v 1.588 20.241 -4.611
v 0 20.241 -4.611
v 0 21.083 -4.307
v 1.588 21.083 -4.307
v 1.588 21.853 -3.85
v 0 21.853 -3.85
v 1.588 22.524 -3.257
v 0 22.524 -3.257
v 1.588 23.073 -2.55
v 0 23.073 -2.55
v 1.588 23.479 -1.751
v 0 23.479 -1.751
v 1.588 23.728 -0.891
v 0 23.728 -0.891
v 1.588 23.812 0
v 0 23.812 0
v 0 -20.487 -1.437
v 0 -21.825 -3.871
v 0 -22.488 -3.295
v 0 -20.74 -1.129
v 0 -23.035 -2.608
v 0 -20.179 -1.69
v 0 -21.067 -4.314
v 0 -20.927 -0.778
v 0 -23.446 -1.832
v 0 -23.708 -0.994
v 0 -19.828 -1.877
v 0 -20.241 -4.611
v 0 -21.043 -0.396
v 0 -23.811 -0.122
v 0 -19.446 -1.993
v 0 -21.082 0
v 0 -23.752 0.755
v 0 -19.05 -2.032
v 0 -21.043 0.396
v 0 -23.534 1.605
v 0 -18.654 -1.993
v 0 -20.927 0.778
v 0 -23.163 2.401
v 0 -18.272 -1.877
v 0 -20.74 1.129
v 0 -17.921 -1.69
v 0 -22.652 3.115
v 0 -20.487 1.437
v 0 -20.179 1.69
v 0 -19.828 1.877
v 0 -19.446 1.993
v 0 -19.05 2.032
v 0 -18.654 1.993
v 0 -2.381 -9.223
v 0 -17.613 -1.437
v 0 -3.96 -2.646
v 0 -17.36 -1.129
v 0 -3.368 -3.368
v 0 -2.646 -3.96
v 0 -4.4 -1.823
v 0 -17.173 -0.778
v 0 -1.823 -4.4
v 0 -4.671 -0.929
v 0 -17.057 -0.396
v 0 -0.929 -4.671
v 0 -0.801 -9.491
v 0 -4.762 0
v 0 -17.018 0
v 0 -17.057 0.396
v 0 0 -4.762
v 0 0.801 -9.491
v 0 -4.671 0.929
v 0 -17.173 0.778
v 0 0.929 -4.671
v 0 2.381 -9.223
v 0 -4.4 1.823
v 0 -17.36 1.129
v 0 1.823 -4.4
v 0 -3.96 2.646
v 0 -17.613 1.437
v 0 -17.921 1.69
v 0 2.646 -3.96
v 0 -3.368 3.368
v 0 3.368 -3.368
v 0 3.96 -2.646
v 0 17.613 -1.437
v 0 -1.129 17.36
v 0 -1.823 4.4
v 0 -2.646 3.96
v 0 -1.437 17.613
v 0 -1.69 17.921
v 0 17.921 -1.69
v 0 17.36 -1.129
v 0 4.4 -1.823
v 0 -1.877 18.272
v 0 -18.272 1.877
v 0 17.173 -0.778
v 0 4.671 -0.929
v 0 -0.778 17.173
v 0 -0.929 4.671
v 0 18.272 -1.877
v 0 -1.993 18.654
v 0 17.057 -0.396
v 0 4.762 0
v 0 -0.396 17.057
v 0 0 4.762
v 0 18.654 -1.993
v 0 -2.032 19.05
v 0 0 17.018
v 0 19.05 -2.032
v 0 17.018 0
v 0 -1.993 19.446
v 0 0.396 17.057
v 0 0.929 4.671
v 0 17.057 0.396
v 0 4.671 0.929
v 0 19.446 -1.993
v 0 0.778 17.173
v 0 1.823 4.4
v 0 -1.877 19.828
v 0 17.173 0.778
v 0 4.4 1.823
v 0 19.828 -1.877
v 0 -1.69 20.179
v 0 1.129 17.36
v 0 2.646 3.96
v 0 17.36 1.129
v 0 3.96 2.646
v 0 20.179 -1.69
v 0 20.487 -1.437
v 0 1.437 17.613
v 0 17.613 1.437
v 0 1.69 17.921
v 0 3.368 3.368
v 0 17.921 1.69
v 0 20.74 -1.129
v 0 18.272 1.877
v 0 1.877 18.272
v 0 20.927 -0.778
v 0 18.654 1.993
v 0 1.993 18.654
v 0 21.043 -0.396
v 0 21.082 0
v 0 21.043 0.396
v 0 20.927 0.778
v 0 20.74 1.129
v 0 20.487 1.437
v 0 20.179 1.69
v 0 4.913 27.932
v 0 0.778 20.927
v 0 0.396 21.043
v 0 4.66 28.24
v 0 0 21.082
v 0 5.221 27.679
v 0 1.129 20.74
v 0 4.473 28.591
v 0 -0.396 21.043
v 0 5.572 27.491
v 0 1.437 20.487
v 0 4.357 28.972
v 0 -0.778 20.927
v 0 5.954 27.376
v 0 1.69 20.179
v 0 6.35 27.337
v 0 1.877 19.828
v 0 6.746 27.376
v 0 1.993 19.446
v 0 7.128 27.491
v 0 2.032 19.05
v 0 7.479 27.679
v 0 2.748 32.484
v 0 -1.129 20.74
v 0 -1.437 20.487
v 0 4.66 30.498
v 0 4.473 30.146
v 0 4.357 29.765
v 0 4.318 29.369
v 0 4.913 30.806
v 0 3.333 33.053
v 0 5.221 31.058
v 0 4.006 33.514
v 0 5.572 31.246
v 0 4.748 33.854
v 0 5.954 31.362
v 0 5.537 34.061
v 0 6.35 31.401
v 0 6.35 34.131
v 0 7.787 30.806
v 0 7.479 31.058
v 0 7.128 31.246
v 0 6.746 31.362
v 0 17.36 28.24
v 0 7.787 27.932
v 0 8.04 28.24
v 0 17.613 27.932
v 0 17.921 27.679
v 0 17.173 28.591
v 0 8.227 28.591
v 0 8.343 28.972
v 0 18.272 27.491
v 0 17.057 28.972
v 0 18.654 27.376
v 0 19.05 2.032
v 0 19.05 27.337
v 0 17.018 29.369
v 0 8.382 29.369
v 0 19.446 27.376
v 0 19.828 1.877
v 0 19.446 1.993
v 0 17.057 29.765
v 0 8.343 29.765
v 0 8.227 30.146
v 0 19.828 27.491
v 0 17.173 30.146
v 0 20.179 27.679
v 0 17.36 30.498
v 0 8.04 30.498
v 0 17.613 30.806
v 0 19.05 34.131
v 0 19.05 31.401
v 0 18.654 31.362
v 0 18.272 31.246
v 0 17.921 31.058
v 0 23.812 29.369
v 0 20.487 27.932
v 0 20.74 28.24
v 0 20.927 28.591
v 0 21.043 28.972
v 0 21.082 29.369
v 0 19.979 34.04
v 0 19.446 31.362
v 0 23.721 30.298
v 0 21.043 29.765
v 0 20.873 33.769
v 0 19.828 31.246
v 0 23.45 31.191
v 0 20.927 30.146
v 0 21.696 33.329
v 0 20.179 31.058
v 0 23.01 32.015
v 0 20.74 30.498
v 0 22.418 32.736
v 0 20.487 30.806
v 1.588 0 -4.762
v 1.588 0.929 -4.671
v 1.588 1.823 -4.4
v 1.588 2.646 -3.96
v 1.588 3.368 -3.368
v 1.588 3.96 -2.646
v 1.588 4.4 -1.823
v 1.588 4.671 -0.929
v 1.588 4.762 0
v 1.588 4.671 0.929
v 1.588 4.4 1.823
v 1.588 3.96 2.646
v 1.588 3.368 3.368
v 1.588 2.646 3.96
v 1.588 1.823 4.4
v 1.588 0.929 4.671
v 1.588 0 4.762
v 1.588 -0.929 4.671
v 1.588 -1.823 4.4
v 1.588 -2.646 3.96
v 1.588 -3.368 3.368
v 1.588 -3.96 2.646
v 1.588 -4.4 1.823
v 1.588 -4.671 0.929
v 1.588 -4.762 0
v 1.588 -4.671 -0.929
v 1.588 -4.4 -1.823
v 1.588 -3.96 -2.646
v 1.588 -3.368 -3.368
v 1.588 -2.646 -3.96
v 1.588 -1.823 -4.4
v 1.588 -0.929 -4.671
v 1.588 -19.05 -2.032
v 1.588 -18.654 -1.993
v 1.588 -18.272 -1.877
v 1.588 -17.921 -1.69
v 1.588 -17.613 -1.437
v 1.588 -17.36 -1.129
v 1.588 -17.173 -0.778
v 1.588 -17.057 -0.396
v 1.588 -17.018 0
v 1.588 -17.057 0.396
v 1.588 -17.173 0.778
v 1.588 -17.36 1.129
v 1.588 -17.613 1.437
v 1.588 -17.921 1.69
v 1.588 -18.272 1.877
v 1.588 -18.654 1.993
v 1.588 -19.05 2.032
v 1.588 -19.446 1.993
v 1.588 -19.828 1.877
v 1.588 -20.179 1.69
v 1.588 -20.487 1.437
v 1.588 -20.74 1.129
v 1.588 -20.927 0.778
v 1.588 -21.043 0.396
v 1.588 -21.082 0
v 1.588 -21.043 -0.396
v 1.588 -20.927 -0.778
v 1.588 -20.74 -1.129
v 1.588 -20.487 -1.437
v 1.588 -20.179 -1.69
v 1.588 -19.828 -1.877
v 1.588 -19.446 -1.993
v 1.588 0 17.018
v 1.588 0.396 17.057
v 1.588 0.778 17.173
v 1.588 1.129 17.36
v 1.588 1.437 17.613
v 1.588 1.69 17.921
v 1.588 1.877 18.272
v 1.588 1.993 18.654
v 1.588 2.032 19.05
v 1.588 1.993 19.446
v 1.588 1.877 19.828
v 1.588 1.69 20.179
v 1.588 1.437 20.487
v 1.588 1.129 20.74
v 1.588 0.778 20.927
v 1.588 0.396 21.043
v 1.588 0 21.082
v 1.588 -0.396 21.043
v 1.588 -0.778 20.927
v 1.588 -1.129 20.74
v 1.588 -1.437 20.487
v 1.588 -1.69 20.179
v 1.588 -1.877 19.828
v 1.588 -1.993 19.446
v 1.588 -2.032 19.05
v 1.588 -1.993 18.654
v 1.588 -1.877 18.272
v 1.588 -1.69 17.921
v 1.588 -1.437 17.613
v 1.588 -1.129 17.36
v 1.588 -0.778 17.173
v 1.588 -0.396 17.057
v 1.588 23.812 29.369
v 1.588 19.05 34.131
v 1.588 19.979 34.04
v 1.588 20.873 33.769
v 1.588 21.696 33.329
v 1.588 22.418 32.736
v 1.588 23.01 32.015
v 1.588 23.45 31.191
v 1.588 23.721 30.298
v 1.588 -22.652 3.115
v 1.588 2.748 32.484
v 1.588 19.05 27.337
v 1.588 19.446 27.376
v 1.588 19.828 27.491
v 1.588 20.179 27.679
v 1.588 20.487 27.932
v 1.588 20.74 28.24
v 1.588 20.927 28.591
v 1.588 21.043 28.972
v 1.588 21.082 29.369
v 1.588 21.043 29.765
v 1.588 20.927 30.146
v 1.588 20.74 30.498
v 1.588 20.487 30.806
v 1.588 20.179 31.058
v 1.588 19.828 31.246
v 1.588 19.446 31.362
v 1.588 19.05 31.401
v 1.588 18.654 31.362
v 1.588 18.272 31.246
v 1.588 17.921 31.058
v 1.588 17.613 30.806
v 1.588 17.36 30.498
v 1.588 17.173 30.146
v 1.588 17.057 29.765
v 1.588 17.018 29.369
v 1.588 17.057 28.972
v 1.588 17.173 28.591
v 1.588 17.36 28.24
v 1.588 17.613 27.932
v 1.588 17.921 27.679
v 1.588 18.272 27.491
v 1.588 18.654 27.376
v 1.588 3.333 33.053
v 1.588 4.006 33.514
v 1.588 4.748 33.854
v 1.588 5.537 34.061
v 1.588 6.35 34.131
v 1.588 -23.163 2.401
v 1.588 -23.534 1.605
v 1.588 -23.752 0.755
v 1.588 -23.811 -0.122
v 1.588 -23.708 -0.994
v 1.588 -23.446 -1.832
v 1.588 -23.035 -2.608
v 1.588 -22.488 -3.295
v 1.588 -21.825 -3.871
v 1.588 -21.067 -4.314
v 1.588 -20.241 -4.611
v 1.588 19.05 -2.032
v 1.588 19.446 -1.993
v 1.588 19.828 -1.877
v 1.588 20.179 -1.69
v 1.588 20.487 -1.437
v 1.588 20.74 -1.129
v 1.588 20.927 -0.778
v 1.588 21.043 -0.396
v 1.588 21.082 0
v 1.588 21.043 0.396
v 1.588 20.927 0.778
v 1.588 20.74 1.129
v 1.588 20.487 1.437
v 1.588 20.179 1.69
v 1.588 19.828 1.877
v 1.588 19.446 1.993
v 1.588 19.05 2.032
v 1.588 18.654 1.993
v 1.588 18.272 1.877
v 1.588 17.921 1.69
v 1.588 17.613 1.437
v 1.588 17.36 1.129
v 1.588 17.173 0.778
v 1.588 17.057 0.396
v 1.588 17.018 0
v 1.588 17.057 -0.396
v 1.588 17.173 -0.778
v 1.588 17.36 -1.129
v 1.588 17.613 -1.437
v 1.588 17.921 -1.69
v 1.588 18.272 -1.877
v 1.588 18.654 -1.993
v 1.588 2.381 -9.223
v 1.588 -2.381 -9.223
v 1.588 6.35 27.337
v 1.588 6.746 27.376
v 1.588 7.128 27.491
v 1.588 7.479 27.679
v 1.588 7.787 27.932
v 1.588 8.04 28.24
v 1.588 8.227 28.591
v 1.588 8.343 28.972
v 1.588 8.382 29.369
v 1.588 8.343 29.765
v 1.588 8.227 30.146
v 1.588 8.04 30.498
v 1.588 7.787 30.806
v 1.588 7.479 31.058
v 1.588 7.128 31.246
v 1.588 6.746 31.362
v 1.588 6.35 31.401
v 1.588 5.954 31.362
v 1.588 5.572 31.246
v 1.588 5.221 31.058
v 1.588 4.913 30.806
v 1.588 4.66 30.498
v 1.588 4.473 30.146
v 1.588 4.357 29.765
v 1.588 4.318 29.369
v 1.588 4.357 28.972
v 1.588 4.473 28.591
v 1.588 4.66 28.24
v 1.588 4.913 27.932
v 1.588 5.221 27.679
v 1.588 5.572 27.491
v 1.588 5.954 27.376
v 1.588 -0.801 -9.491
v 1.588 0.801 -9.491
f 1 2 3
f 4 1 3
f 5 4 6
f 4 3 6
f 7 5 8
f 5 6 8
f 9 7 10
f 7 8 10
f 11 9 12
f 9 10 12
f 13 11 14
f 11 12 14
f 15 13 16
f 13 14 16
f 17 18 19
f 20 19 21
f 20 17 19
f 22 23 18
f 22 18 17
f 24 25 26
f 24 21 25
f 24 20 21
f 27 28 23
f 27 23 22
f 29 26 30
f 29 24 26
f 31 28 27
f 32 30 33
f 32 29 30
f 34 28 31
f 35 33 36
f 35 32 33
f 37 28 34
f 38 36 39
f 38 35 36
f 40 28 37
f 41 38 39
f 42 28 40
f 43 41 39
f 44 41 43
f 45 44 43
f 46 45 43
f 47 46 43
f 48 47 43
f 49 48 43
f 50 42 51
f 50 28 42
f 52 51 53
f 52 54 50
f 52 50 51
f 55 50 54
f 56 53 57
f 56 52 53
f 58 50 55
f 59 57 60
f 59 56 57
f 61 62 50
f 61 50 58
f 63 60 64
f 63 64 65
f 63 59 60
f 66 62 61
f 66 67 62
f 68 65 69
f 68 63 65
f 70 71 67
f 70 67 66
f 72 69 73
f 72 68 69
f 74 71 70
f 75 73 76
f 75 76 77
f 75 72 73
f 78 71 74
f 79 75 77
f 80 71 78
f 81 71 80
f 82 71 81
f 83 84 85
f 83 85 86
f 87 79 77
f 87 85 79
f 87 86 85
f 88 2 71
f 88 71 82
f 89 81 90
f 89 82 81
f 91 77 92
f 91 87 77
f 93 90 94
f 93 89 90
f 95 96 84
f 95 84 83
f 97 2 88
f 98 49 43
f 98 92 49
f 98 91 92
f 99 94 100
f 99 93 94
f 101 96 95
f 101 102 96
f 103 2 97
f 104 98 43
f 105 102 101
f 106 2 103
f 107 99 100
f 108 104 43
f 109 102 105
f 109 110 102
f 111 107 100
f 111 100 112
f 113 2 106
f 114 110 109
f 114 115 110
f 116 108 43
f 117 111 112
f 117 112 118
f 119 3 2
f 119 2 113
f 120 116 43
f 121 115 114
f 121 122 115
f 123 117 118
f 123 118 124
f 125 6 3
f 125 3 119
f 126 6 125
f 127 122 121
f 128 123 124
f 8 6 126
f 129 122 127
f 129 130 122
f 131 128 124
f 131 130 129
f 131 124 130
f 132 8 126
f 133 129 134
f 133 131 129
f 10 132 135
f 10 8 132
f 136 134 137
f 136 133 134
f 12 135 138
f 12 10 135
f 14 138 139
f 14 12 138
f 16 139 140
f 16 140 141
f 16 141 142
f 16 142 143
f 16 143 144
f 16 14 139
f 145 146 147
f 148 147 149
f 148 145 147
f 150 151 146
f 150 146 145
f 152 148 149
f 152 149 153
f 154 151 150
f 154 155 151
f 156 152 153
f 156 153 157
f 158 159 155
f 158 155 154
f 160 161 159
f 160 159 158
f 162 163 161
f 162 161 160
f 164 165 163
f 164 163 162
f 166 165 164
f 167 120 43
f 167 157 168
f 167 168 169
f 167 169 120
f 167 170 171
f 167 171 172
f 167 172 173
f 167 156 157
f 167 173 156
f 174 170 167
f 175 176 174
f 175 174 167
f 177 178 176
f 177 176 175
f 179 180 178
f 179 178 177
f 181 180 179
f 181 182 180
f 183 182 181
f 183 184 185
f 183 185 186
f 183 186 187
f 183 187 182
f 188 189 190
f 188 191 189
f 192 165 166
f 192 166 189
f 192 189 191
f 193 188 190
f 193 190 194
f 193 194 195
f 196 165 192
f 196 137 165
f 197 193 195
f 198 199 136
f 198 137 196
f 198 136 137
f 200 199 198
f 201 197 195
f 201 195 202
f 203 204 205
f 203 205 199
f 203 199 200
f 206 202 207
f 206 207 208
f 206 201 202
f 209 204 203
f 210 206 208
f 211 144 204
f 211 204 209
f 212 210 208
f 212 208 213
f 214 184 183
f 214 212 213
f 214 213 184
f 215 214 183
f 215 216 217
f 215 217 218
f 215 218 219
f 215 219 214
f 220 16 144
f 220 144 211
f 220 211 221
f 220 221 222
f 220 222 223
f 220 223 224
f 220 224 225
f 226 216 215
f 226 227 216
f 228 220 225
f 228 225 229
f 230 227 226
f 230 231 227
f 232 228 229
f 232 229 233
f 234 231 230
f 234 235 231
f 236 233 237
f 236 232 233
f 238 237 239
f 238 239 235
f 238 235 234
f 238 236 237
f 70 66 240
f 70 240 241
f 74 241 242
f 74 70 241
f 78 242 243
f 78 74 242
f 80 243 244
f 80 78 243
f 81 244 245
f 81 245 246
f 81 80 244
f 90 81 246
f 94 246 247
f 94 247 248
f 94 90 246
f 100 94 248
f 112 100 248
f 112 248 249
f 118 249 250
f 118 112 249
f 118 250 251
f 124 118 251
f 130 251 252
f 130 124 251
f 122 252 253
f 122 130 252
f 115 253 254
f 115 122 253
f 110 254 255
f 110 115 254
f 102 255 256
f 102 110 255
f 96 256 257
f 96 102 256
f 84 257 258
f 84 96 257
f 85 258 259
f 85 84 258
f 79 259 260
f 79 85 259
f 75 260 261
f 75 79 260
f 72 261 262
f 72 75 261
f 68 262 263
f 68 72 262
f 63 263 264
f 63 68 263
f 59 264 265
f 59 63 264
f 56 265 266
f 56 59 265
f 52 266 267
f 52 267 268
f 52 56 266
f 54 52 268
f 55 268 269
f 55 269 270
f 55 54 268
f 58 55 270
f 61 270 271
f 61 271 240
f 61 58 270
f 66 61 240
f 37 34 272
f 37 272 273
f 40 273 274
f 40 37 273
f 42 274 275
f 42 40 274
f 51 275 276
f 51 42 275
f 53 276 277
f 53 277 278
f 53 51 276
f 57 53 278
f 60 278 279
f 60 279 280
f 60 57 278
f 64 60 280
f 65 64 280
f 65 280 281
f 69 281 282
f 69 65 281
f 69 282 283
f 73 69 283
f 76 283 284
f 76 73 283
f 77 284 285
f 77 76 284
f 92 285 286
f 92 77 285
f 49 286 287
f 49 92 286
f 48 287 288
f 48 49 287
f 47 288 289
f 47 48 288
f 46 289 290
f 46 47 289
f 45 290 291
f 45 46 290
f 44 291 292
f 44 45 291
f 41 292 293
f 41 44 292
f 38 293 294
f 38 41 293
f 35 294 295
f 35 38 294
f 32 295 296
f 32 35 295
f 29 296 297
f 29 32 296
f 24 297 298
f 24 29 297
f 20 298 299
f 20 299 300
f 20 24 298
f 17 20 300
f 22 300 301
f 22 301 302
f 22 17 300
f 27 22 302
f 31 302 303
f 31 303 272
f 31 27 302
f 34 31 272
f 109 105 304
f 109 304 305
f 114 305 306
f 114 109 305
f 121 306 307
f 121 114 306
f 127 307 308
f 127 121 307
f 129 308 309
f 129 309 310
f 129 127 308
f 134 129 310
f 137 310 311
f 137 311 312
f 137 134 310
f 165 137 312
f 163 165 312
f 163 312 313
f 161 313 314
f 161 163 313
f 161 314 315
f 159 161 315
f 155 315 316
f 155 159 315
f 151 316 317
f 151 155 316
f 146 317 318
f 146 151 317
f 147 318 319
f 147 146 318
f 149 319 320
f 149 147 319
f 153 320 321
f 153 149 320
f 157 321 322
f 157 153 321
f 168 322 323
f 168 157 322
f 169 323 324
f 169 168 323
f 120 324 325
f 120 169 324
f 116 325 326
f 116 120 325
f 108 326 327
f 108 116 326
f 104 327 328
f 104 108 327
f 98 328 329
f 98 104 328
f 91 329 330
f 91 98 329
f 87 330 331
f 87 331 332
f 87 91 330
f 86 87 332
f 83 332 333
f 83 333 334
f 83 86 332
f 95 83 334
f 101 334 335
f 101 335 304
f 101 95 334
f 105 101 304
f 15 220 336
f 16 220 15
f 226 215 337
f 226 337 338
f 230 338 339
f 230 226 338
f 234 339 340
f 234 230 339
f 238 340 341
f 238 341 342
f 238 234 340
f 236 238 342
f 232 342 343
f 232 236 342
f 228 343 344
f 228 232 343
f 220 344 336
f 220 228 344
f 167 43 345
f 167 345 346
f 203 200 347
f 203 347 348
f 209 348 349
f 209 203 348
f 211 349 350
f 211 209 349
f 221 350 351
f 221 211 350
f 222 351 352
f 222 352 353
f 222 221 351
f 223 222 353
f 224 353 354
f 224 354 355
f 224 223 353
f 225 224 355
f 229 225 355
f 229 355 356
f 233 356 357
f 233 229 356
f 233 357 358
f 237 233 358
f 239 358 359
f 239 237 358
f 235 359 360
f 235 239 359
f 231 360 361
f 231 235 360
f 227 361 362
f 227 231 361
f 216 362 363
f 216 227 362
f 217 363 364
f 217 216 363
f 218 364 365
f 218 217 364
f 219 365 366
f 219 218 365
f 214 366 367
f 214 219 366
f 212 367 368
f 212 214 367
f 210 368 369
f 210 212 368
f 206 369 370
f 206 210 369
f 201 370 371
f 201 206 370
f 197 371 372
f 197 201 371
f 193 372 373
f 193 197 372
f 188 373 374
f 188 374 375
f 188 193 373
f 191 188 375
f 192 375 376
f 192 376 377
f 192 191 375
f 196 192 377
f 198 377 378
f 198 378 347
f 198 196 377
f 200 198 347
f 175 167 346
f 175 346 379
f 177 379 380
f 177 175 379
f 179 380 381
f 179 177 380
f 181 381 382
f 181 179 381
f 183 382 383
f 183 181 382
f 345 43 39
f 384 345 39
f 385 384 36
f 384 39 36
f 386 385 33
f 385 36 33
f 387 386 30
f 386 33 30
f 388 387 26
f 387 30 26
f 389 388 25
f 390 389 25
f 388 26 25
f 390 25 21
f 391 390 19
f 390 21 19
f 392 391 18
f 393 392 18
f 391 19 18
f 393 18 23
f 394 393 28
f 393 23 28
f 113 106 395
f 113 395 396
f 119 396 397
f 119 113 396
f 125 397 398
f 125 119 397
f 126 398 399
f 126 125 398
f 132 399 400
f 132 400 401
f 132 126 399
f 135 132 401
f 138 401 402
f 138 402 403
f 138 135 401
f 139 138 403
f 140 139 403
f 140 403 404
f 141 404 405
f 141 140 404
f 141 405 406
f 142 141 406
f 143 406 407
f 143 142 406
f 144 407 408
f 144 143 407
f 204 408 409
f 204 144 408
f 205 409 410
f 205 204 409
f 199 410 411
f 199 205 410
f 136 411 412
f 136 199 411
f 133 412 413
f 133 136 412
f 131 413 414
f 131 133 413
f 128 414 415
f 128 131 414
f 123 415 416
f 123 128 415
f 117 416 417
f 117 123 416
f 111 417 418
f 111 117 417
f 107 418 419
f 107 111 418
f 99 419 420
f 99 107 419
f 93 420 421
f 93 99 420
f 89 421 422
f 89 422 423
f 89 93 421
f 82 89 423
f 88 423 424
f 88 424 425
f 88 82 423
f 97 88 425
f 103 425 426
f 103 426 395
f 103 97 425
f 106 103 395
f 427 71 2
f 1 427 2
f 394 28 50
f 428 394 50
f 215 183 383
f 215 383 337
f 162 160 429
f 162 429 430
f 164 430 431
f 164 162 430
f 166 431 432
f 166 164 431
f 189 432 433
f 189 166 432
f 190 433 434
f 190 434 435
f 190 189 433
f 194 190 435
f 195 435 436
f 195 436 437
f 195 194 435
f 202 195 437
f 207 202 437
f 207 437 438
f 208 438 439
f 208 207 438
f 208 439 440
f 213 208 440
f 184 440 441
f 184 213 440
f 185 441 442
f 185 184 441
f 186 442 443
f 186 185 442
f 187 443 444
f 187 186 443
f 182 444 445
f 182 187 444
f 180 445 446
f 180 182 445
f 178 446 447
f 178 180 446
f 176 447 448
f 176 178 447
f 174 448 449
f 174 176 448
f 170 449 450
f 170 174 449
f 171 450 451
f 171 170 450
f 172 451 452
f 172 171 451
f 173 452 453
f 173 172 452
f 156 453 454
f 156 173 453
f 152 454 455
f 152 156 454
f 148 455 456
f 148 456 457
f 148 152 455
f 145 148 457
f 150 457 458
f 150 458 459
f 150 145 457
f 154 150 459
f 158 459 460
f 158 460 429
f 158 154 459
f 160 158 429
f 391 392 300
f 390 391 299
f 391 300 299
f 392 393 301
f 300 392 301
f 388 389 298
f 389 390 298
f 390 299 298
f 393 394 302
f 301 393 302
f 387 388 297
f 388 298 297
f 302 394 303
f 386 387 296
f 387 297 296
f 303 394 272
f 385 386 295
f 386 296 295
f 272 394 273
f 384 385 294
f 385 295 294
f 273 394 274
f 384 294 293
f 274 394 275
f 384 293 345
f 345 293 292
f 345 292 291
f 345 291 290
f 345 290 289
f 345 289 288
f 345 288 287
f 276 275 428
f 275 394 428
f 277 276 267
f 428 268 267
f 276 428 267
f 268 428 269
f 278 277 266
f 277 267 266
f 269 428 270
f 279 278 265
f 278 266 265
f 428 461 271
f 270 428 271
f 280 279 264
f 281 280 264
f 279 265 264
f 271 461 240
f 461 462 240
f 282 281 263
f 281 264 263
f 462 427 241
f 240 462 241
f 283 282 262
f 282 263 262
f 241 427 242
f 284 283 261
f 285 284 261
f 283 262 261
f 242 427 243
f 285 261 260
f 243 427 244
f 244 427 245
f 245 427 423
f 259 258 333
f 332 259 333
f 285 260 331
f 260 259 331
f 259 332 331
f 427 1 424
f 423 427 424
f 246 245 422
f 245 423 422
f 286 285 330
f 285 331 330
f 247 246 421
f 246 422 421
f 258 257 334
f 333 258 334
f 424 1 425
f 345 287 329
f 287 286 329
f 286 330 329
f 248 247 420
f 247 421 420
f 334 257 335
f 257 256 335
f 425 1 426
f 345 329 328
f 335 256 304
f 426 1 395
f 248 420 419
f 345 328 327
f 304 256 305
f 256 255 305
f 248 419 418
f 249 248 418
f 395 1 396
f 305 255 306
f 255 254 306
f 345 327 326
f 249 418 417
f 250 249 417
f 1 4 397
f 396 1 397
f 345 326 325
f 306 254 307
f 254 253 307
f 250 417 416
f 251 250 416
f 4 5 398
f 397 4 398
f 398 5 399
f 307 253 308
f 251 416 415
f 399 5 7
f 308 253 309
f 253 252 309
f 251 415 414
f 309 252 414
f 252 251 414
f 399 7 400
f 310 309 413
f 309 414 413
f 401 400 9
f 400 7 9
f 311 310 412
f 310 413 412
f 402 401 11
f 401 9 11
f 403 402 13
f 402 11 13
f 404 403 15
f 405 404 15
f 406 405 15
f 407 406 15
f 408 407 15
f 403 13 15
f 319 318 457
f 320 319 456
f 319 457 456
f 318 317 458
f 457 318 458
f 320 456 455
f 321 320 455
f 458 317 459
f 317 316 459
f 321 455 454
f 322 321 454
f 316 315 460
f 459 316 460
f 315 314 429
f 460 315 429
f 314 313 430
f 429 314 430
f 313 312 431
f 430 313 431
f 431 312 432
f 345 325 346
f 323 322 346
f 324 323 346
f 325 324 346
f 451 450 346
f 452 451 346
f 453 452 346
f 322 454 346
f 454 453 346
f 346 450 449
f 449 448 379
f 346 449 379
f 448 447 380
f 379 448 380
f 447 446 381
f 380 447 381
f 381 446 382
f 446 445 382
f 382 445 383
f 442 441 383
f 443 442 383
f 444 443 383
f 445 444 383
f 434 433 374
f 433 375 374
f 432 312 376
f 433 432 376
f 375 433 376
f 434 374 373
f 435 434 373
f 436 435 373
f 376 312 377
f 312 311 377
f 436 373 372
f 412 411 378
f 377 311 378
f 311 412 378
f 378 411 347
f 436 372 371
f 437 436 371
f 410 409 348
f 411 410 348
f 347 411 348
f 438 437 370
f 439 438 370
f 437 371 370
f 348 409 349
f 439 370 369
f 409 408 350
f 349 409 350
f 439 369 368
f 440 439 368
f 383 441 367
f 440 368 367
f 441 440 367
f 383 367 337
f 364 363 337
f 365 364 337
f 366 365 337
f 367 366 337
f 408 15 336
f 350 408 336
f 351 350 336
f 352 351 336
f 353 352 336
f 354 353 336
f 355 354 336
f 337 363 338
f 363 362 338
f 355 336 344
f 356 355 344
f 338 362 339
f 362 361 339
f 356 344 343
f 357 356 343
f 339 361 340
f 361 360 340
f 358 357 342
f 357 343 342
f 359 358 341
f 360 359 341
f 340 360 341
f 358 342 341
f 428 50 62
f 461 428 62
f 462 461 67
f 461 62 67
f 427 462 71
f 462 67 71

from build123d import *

# Parameters (mm, degrees)
SKETCH1_R           = 4.7625
SKETCH1_R_2         = 2.032
BOSS_EXTRUDE1_DEPTH = 1.5875
BOSS_EXTRUDE2_START = -1.5875
SKETCH2_R           = 2.032
BOSS_EXTRUDE2_DEPTH = 1.5875


with BuildPart() as part:
    # Sketch1 → Boss-Extrude1 (new body)
    with BuildSketch(Plane(origin=(0, 0, 0), x_dir=(0, 0, -1), z_dir=(1, 0, 0))):
        with BuildLine():
            Line((-3.367596045, 22.417596045), (-22.417596045, 3.367596045))
            ThreePointArc((-22.417596045, 3.367596045), (-23.8125, 0), (-22.417596045, -3.367596045))
            Line((-22.417596045, -3.367596045), (-3.367596045, -22.417596045))
            ThreePointArc((-3.367596045, -22.417596045), (1.253587833, -23.64455371), (4.611270797, -20.240625))
            Line((4.611270797, -20.240625), (9.222541593, -2.38125))
            ThreePointArc((9.222541593, -2.38125), (9.525, 0), (9.222541593, 2.38125))
            Line((9.222541593, 2.38125), (4.611270797, 20.240625))
            ThreePointArc((4.611270797, 20.240625), (1.253587833, 23.64455371), (-3.367596045, 22.417596045))
        make_face()
        Circle(SKETCH1_R, mode=Mode.SUBTRACT)
        with Locations((0, 19.05)):
            Circle(SKETCH1_R_2, mode=Mode.SUBTRACT)
        with Locations((-19.05, 0)):
            Circle(SKETCH1_R_2, mode=Mode.SUBTRACT)
        with Locations((0, -19.05)):
            Circle(SKETCH1_R_2, mode=Mode.SUBTRACT)
    extrude(amount=BOSS_EXTRUDE1_DEPTH)

    # Sketch2 → Boss-Extrude2 (add)
    with BuildSketch(Plane(origin=(1.5875, 0, 0), x_dir=(0, 0, -1), z_dir=(1, 0, 0)).offset(BOSS_EXTRUDE2_START)):
        with BuildLine():
            Line((-3.115398581, -22.652179609), (-32.484148581, 2.747820391))
            ThreePointArc((-32.484148581, 2.747820391), (-33.699944523, 4.369555541), (-34.13125, 6.35))
            Line((-34.13125, 6.35), (-34.13125, 19.05))
            ThreePointArc((-34.13125, 19.05), (-32.736346045, 22.417596045), (-29.36875, 23.8125))
            Line((-29.36875, 23.8125), (0, 23.8125))
            ThreePointArc((0, 23.8125), (-1.822529847, 23.449976274), (-3.367596045, 22.417596045))
            Line((-3.367596045, 22.417596045), (-22.417596045, 3.367596045))
            ThreePointArc((-22.417596045, 3.367596045), (-23.8125, 0), (-22.417596045, -3.367596045))
            Line((-22.417596045, -3.367596045), (-3.367596045, -22.417596045))
            ThreePointArc((-3.367596045, -22.417596045), (-3.243618688, -22.537168487), (-3.115398581, -22.652179609))
        make_face()
        with Locations((-29.36875, 6.35)):
            Circle(SKETCH2_R, mode=Mode.SUBTRACT)
        with Locations((-29.36875, 19.05)):
            Circle(SKETCH2_R, mode=Mode.SUBTRACT)
    extrude(amount=BOSS_EXTRUDE2_DEPTH)


solid = part.part
